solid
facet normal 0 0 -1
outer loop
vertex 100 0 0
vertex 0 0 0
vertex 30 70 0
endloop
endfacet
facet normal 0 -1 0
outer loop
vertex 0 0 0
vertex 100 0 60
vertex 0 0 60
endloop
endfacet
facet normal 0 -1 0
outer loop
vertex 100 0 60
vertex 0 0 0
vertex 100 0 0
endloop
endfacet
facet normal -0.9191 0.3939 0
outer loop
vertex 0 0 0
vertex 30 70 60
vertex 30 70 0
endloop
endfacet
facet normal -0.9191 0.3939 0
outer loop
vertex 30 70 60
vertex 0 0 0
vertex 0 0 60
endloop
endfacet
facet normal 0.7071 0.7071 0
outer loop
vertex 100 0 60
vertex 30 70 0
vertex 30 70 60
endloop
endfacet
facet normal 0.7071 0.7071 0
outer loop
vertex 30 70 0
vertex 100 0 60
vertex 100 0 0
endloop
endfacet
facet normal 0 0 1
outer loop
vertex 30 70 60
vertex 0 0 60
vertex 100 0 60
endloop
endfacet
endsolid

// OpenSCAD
// ========================
// PRISMA TRIANGULAR = T1+T2+T3, COM PINOS/RASGOS
// Thiago — modelo paramétrico para impressão 3D
// Unidades: mm
// ========================

// ----- Parâmetros geométricos do prisma
h  = 60;                      // altura do prisma
A  = [0,   0, 0];
B  = [100, 0, 0];
C  = [30, 70, 0];

A1 = A + [0,0,h];
B1 = B + [0,0,h];
C1 = C + [0,0,h];

// ----- Encaixes (ajuste conforme a impressora/material)
pin_r        = 2.0;           // raio do pino (macho)
pin_h        = 4.0;           // altura do pino além do plano da face
clearance    = 0.30;          // folga total (diferença de raio do furo)
tip_shrink   = 0.30;          // conicidade da ponta do pino (facilita entrada)
edge_margin  = 6.0;           // distância mínima do pino às arestas da face

// ----- Visualização/exportação
// 0 = prisma inteiro (união) | 1 = T1 | 2 = T2 | 3 = T3
which_piece = 0;

// ========================
// Utilitários vetoriais
// ========================
function vadd(a,b)      = [a[0]+b[0], a[1]+b[1], a[2]+b[2]];
function vsub(a,b)      = [a[0]-b[0], a[1]-b[1], a[2]-b[2]];
function smul(s,a)      = [s*a[0], s*a[1], s*a[2]];
function dot(a,b)       = a[0]*b[0] + a[1]*b[1] + a[2]*b[2];
function cross(a,b)     = [ a[1]*b[2]-a[2]*b[1], a[2]*b[0]-a[0]*b[2], a[0]*b[1]-a[1]*b[0] ];
function norm(a)        = sqrt(dot(a,a));
function normalize(a)   = let(n=norm(a)) (n==0 ? [0,0,0] : smul(1/n,a));

function tri_centroid(P,Q,R) = smul(1/3, vadd(P, vadd(Q,R)));

function min3(a,b,c)    = min(a, min(b,c));
function dist(P,Q)      = norm(vsub(P,Q));

// Menor aresta do triângulo
function min_edge_len(P,Q,R) =
    min3(dist(P,Q), dist(Q,R), dist(R,P));

// Moldura ortonormal da face (coloca a face no plano XY, normal em +Z)
function face_frame(P,Q,R) =
    let( ex = normalize(vsub(Q,P)),
         n  = normalize(cross(vsub(Q,P), vsub(R,P))),
         ez = n,
         ey = cross(ez, ex),
         O  = tri_centroid(P,Q,R)
    ) [
        [ex[0], ey[0], ez[0], O[0]],
        [ex[1], ey[1], ez[1], O[1]],
        [ex[2], ey[2], ez[2], O[2]],
        [0,     0,     0,     1   ]
    ];

// Dois pontos para pinos em torno do centróide, ao longo de ex
// Escolhemos deslocamento com base na menor aresta e edge_margin
function pin_offsets(P,Q,R) =
    let( Lmin = min_edge_len(P,Q,R),
         d    = max(edge_margin, 0.20*Lmin)
    )
    [ [ d, 0, 0], [ -d, 0, 0] ];

// ========================
// Primitivas
// ========================
module tetra(p0,p1,p2,p3){
    // orientação consistente
    polyhedron(
        points=[p0,p1,p2,p3],
        faces=[
            [0,2,1],
            [0,1,3],
            [1,2,3],
            [2,0,3]
        ]
    );
}

// Pino “macho” com leve conicidade na ponta
module pin_male(r=pin_r, h=pin_h, tip=tip_shrink){
    // haste cilíndrica + ponta cônica curta
    union(){
        translate([0,0,0])       cylinder(h=h-1.0, r=r, $fn=48);
        translate([0,0,h-1.0])   cylinder(h=1.0, r1=r, r2=max(r-tip, 0.1), $fn=48);
    }
}

// Rasgo “fêmea” (furos) — raio aumentado pela folga
module pin_female(r=pin_r, h=pin_h, clear=clearance){
    cylinder(h=h+1.0, r=r+clear, $fn=48); // um pouco mais fundo para garantir subtração
}

// Coloca dois pinos na face (P,Q,R) saindo no sentido +Z local
module add_pins_on_face(P,Q,R, male=true){
    multmatrix(face_frame(P,Q,R)){
        for (xy = pin_offsets(P,Q,R)){
            translate(xy)
                if (male)
                    pin_male();
                else
                    pin_female();
        }
    }
}

// Subtrai (rasgos) na face — empurra no -Z local para atravessar bem a peça
module subtract_pins_on_face(P,Q,R){
    multmatrix(face_frame(P,Q,R)){
        // dá um mergulho para o lado negativo também
        translate([0,0,-(pin_h+1)])
            for (xy = pin_offsets(P,Q,R)){
                translate(xy)
                    pin_female();
            }
    }
}

// ========================
// Peças com encaixes
// ========================
// T1 e T2 compartilham a face (A1,B,C)
// T2 e T3 compartilham a face (A1,B1,C)

// T1: tetra(A,B,C,A1) com pinos macho na face compartilhada com T2
module T1(){
    difference(){
        // corpo
        tetra(A,B,C,A1);
        // (nenhum rasgo em T1)
    }
    // pinos para acoplar com T2, saindo do plano A1-B-C
    add_pins_on_face(A1,B,C, male=true);
}

// T2: tetra(A1,B,B1,C) com rasgos para T1 e pinos para T3
module T2(){
    difference(){
        tetra(A1,B,B1,C);
        // rasgos para receber T1
        subtract_pins_on_face(A1,B,C);
        // rasgos para receber T3? — aqui T2 é macho para T3, então não
    }
    // pinos macho para acoplar em T3 na face (A1,B1,C)
    add_pins_on_face(A1,B1,C, male=true);
}

// T3: tetra(A1,B1,C1,C) com rasgos para T2
module T3(){
    difference(){
        tetra(A1,B1,C1,C);
        // rasgos para receber T2
        subtract_pins_on_face(A1,B1,C);
    }
    // (nenhum pino em T3)
}

// ========================
// Seletor para visualização/exportação
// ========================
module ALL(){ T1(); T2(); T3(); }

if (which_piece == 0){
    // Para conferir a recomposição do prisma
    // Use F6 e visualize a união no slicer
    ALL();
} else if (which_piece == 1){
    T1();
} else if (which_piece == 2){
    T2();
} else if (which_piece == 3){
    T3();
}
